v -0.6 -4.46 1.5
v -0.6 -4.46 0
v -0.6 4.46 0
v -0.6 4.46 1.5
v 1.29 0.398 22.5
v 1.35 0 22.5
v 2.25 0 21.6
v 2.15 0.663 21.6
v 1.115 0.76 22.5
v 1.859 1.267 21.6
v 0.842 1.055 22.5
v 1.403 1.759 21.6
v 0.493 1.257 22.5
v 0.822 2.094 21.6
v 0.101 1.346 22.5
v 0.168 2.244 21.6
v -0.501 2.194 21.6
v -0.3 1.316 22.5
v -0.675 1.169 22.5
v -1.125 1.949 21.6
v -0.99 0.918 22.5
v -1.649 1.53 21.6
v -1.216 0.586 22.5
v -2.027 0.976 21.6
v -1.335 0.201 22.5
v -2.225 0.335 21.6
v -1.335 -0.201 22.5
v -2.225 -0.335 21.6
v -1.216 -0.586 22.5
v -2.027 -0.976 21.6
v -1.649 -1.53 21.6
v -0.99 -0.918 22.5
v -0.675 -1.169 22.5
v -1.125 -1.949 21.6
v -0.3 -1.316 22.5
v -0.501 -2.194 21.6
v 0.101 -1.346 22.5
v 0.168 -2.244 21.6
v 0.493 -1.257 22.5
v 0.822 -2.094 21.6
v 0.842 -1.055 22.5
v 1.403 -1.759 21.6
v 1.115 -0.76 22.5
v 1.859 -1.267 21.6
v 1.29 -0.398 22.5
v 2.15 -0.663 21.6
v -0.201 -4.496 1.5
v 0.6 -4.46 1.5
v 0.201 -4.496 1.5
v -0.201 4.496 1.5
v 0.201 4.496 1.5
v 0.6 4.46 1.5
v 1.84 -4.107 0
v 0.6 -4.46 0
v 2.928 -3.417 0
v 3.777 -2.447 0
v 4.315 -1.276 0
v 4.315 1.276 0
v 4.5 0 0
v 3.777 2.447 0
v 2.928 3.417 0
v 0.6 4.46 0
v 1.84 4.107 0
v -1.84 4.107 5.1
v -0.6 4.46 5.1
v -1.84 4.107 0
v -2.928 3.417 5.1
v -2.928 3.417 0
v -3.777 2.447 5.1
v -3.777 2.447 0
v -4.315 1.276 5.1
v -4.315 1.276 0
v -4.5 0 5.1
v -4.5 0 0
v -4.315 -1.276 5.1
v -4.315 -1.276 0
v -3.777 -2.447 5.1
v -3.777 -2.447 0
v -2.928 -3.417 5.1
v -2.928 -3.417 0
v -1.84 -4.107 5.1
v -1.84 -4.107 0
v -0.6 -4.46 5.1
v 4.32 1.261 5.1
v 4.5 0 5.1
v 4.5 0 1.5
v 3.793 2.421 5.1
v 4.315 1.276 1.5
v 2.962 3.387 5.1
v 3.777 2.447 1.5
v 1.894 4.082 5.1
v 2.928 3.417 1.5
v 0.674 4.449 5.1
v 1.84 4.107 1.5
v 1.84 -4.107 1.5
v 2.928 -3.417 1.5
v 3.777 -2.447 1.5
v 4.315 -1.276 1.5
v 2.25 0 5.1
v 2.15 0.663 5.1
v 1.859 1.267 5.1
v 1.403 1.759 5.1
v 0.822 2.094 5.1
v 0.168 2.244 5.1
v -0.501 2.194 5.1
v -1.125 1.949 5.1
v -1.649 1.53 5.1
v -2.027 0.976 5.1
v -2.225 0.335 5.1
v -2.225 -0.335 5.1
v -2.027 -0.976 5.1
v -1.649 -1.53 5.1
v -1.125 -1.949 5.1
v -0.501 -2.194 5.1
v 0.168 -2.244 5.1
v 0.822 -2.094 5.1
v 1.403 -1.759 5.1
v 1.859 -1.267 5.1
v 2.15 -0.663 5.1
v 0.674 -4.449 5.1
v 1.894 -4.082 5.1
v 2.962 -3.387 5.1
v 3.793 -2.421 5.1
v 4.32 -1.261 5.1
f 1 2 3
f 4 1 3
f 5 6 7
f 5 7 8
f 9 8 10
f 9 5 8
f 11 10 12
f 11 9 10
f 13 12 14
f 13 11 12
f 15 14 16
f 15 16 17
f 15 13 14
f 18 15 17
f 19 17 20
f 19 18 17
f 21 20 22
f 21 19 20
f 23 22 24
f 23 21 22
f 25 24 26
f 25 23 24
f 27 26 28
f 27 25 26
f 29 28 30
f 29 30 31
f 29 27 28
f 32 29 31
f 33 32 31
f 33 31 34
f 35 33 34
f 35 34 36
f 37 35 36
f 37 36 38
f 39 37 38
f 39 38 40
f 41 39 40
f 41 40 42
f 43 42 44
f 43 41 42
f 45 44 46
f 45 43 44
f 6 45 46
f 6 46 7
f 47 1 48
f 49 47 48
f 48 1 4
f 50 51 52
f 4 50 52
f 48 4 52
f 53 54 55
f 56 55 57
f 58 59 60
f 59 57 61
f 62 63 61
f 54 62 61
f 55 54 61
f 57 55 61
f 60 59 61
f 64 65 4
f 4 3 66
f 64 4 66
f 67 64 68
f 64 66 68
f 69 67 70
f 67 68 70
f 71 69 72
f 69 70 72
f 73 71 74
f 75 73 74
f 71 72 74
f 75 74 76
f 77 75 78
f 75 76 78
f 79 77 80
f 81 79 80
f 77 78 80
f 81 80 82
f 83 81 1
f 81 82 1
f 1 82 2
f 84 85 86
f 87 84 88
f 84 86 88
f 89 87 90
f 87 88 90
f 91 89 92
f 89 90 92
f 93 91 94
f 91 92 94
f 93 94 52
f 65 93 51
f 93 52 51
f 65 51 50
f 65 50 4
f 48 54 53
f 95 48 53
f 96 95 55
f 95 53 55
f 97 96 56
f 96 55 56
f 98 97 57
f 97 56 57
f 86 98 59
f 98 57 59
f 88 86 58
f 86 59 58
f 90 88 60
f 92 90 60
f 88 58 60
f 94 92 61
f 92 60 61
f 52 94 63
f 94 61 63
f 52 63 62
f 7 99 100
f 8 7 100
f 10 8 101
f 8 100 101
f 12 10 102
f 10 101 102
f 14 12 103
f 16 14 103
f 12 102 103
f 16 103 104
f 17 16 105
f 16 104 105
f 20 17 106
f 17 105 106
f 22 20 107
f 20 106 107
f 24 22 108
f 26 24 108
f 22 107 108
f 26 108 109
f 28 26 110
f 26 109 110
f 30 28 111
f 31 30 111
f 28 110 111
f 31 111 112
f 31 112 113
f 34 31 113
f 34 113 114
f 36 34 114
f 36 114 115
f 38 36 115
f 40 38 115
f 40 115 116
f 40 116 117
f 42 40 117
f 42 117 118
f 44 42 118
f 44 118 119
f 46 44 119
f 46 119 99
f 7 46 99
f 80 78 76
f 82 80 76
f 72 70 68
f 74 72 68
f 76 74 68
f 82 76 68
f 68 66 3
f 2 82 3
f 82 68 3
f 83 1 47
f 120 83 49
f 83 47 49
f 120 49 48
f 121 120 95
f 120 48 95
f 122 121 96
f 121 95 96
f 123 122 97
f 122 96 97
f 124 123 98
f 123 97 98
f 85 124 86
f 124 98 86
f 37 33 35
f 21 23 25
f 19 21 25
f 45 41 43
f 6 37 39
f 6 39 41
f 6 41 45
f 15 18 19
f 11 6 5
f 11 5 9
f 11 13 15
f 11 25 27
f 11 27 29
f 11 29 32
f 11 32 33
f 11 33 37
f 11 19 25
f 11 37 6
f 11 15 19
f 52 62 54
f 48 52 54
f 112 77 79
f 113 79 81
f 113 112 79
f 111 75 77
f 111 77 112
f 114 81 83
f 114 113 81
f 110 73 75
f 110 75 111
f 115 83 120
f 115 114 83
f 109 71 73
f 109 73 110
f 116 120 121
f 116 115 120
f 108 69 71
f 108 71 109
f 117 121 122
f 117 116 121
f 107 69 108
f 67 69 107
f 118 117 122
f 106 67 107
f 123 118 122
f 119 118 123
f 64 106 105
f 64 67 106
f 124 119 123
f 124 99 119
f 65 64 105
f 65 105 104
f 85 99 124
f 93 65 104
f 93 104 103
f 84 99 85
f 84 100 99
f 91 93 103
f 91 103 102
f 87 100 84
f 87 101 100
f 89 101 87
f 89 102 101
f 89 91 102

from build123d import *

# Parameters (mm, degrees)
F1_DEPTH = 0.5
F3_DEPTH = 1.2
F4_R     = 0.75
F5_DEPTH = 2
F6_R     = 0.75
F7_DEPTH = 3.8
F8_SIZE  = 0.3
F9_SCALE = 3


with BuildPart() as f1:
    # F0 (on Top) → F1 (new body)
    with BuildSketch(Plane.XY):
        with BuildLine():
            Line((-0.2, -1.4866068747), (-0.2, 1.4866068747))
            ThreePointArc((-0.2, 1.4866068747), (-1.5, 0), (-0.2, -1.4866068747))
        make_face()
    extrude(amount=F1_DEPTH)



with BuildPart() as f1b:
    # F0 (on Top) → F1, piece 2 (new body)
    with BuildSketch(Plane.XY):
        with BuildLine():
            ThreePointArc((0.2, -1.4866068747), (1.5, 0), (0.2, 1.4866068747))
            Line((0.2, 1.4866068747), (0.2, -1.4866068747))
        make_face()
    extrude(amount=F1_DEPTH)


with BuildPart() as f1_1:
    add(f1.part)

    add(f1b.part)  # F3 merges F1b
    # F2 (on face) → F3 (join)
    with BuildSketch(Plane.XY.offset(0.5)):
        with BuildLine():
            Line((-0.2, -1.4866068747), (-0.2, 1.4866068747))
            ThreePointArc((-0.2, 1.4866068747), (-1.5, 0), (-0.2, -1.4866068747))
        make_face()
        with BuildLine():
            ThreePointArc((-0.2, -1.4866068747), (0.9874208829, -1.1291589791), (1.5, 0))
            ThreePointArc((1.5, 0), (0.9874208829, 1.1291589791), (-0.2, 1.4866068747))
            Line((-0.2, 1.4866068747), (-0.2, -1.4866068747))
        make_face()
    extrude(amount=F3_DEPTH)

    # F4 (on face) → F5 (join)
    with BuildSketch(Plane.XY.offset(1.7)):
        Circle(F4_R)
    extrude(amount=F5_DEPTH)

    # F6 (on face) → F7 (join)
    with BuildSketch(Plane.XY.offset(3.7)):
        Circle(F6_R)
    extrude(amount=F7_DEPTH)

    # F8
    f8_edges = [f1_1.edges().sort_by_distance(p)[0] for p in [
        (-0.75, 0, 7.5),
    ]]
    chamfer(f8_edges, length=F8_SIZE)


with BuildPart() as f1_2:
    # F9: moved
    add(f1_1.part.scale(F9_SCALE))


solid = f1_2.part
